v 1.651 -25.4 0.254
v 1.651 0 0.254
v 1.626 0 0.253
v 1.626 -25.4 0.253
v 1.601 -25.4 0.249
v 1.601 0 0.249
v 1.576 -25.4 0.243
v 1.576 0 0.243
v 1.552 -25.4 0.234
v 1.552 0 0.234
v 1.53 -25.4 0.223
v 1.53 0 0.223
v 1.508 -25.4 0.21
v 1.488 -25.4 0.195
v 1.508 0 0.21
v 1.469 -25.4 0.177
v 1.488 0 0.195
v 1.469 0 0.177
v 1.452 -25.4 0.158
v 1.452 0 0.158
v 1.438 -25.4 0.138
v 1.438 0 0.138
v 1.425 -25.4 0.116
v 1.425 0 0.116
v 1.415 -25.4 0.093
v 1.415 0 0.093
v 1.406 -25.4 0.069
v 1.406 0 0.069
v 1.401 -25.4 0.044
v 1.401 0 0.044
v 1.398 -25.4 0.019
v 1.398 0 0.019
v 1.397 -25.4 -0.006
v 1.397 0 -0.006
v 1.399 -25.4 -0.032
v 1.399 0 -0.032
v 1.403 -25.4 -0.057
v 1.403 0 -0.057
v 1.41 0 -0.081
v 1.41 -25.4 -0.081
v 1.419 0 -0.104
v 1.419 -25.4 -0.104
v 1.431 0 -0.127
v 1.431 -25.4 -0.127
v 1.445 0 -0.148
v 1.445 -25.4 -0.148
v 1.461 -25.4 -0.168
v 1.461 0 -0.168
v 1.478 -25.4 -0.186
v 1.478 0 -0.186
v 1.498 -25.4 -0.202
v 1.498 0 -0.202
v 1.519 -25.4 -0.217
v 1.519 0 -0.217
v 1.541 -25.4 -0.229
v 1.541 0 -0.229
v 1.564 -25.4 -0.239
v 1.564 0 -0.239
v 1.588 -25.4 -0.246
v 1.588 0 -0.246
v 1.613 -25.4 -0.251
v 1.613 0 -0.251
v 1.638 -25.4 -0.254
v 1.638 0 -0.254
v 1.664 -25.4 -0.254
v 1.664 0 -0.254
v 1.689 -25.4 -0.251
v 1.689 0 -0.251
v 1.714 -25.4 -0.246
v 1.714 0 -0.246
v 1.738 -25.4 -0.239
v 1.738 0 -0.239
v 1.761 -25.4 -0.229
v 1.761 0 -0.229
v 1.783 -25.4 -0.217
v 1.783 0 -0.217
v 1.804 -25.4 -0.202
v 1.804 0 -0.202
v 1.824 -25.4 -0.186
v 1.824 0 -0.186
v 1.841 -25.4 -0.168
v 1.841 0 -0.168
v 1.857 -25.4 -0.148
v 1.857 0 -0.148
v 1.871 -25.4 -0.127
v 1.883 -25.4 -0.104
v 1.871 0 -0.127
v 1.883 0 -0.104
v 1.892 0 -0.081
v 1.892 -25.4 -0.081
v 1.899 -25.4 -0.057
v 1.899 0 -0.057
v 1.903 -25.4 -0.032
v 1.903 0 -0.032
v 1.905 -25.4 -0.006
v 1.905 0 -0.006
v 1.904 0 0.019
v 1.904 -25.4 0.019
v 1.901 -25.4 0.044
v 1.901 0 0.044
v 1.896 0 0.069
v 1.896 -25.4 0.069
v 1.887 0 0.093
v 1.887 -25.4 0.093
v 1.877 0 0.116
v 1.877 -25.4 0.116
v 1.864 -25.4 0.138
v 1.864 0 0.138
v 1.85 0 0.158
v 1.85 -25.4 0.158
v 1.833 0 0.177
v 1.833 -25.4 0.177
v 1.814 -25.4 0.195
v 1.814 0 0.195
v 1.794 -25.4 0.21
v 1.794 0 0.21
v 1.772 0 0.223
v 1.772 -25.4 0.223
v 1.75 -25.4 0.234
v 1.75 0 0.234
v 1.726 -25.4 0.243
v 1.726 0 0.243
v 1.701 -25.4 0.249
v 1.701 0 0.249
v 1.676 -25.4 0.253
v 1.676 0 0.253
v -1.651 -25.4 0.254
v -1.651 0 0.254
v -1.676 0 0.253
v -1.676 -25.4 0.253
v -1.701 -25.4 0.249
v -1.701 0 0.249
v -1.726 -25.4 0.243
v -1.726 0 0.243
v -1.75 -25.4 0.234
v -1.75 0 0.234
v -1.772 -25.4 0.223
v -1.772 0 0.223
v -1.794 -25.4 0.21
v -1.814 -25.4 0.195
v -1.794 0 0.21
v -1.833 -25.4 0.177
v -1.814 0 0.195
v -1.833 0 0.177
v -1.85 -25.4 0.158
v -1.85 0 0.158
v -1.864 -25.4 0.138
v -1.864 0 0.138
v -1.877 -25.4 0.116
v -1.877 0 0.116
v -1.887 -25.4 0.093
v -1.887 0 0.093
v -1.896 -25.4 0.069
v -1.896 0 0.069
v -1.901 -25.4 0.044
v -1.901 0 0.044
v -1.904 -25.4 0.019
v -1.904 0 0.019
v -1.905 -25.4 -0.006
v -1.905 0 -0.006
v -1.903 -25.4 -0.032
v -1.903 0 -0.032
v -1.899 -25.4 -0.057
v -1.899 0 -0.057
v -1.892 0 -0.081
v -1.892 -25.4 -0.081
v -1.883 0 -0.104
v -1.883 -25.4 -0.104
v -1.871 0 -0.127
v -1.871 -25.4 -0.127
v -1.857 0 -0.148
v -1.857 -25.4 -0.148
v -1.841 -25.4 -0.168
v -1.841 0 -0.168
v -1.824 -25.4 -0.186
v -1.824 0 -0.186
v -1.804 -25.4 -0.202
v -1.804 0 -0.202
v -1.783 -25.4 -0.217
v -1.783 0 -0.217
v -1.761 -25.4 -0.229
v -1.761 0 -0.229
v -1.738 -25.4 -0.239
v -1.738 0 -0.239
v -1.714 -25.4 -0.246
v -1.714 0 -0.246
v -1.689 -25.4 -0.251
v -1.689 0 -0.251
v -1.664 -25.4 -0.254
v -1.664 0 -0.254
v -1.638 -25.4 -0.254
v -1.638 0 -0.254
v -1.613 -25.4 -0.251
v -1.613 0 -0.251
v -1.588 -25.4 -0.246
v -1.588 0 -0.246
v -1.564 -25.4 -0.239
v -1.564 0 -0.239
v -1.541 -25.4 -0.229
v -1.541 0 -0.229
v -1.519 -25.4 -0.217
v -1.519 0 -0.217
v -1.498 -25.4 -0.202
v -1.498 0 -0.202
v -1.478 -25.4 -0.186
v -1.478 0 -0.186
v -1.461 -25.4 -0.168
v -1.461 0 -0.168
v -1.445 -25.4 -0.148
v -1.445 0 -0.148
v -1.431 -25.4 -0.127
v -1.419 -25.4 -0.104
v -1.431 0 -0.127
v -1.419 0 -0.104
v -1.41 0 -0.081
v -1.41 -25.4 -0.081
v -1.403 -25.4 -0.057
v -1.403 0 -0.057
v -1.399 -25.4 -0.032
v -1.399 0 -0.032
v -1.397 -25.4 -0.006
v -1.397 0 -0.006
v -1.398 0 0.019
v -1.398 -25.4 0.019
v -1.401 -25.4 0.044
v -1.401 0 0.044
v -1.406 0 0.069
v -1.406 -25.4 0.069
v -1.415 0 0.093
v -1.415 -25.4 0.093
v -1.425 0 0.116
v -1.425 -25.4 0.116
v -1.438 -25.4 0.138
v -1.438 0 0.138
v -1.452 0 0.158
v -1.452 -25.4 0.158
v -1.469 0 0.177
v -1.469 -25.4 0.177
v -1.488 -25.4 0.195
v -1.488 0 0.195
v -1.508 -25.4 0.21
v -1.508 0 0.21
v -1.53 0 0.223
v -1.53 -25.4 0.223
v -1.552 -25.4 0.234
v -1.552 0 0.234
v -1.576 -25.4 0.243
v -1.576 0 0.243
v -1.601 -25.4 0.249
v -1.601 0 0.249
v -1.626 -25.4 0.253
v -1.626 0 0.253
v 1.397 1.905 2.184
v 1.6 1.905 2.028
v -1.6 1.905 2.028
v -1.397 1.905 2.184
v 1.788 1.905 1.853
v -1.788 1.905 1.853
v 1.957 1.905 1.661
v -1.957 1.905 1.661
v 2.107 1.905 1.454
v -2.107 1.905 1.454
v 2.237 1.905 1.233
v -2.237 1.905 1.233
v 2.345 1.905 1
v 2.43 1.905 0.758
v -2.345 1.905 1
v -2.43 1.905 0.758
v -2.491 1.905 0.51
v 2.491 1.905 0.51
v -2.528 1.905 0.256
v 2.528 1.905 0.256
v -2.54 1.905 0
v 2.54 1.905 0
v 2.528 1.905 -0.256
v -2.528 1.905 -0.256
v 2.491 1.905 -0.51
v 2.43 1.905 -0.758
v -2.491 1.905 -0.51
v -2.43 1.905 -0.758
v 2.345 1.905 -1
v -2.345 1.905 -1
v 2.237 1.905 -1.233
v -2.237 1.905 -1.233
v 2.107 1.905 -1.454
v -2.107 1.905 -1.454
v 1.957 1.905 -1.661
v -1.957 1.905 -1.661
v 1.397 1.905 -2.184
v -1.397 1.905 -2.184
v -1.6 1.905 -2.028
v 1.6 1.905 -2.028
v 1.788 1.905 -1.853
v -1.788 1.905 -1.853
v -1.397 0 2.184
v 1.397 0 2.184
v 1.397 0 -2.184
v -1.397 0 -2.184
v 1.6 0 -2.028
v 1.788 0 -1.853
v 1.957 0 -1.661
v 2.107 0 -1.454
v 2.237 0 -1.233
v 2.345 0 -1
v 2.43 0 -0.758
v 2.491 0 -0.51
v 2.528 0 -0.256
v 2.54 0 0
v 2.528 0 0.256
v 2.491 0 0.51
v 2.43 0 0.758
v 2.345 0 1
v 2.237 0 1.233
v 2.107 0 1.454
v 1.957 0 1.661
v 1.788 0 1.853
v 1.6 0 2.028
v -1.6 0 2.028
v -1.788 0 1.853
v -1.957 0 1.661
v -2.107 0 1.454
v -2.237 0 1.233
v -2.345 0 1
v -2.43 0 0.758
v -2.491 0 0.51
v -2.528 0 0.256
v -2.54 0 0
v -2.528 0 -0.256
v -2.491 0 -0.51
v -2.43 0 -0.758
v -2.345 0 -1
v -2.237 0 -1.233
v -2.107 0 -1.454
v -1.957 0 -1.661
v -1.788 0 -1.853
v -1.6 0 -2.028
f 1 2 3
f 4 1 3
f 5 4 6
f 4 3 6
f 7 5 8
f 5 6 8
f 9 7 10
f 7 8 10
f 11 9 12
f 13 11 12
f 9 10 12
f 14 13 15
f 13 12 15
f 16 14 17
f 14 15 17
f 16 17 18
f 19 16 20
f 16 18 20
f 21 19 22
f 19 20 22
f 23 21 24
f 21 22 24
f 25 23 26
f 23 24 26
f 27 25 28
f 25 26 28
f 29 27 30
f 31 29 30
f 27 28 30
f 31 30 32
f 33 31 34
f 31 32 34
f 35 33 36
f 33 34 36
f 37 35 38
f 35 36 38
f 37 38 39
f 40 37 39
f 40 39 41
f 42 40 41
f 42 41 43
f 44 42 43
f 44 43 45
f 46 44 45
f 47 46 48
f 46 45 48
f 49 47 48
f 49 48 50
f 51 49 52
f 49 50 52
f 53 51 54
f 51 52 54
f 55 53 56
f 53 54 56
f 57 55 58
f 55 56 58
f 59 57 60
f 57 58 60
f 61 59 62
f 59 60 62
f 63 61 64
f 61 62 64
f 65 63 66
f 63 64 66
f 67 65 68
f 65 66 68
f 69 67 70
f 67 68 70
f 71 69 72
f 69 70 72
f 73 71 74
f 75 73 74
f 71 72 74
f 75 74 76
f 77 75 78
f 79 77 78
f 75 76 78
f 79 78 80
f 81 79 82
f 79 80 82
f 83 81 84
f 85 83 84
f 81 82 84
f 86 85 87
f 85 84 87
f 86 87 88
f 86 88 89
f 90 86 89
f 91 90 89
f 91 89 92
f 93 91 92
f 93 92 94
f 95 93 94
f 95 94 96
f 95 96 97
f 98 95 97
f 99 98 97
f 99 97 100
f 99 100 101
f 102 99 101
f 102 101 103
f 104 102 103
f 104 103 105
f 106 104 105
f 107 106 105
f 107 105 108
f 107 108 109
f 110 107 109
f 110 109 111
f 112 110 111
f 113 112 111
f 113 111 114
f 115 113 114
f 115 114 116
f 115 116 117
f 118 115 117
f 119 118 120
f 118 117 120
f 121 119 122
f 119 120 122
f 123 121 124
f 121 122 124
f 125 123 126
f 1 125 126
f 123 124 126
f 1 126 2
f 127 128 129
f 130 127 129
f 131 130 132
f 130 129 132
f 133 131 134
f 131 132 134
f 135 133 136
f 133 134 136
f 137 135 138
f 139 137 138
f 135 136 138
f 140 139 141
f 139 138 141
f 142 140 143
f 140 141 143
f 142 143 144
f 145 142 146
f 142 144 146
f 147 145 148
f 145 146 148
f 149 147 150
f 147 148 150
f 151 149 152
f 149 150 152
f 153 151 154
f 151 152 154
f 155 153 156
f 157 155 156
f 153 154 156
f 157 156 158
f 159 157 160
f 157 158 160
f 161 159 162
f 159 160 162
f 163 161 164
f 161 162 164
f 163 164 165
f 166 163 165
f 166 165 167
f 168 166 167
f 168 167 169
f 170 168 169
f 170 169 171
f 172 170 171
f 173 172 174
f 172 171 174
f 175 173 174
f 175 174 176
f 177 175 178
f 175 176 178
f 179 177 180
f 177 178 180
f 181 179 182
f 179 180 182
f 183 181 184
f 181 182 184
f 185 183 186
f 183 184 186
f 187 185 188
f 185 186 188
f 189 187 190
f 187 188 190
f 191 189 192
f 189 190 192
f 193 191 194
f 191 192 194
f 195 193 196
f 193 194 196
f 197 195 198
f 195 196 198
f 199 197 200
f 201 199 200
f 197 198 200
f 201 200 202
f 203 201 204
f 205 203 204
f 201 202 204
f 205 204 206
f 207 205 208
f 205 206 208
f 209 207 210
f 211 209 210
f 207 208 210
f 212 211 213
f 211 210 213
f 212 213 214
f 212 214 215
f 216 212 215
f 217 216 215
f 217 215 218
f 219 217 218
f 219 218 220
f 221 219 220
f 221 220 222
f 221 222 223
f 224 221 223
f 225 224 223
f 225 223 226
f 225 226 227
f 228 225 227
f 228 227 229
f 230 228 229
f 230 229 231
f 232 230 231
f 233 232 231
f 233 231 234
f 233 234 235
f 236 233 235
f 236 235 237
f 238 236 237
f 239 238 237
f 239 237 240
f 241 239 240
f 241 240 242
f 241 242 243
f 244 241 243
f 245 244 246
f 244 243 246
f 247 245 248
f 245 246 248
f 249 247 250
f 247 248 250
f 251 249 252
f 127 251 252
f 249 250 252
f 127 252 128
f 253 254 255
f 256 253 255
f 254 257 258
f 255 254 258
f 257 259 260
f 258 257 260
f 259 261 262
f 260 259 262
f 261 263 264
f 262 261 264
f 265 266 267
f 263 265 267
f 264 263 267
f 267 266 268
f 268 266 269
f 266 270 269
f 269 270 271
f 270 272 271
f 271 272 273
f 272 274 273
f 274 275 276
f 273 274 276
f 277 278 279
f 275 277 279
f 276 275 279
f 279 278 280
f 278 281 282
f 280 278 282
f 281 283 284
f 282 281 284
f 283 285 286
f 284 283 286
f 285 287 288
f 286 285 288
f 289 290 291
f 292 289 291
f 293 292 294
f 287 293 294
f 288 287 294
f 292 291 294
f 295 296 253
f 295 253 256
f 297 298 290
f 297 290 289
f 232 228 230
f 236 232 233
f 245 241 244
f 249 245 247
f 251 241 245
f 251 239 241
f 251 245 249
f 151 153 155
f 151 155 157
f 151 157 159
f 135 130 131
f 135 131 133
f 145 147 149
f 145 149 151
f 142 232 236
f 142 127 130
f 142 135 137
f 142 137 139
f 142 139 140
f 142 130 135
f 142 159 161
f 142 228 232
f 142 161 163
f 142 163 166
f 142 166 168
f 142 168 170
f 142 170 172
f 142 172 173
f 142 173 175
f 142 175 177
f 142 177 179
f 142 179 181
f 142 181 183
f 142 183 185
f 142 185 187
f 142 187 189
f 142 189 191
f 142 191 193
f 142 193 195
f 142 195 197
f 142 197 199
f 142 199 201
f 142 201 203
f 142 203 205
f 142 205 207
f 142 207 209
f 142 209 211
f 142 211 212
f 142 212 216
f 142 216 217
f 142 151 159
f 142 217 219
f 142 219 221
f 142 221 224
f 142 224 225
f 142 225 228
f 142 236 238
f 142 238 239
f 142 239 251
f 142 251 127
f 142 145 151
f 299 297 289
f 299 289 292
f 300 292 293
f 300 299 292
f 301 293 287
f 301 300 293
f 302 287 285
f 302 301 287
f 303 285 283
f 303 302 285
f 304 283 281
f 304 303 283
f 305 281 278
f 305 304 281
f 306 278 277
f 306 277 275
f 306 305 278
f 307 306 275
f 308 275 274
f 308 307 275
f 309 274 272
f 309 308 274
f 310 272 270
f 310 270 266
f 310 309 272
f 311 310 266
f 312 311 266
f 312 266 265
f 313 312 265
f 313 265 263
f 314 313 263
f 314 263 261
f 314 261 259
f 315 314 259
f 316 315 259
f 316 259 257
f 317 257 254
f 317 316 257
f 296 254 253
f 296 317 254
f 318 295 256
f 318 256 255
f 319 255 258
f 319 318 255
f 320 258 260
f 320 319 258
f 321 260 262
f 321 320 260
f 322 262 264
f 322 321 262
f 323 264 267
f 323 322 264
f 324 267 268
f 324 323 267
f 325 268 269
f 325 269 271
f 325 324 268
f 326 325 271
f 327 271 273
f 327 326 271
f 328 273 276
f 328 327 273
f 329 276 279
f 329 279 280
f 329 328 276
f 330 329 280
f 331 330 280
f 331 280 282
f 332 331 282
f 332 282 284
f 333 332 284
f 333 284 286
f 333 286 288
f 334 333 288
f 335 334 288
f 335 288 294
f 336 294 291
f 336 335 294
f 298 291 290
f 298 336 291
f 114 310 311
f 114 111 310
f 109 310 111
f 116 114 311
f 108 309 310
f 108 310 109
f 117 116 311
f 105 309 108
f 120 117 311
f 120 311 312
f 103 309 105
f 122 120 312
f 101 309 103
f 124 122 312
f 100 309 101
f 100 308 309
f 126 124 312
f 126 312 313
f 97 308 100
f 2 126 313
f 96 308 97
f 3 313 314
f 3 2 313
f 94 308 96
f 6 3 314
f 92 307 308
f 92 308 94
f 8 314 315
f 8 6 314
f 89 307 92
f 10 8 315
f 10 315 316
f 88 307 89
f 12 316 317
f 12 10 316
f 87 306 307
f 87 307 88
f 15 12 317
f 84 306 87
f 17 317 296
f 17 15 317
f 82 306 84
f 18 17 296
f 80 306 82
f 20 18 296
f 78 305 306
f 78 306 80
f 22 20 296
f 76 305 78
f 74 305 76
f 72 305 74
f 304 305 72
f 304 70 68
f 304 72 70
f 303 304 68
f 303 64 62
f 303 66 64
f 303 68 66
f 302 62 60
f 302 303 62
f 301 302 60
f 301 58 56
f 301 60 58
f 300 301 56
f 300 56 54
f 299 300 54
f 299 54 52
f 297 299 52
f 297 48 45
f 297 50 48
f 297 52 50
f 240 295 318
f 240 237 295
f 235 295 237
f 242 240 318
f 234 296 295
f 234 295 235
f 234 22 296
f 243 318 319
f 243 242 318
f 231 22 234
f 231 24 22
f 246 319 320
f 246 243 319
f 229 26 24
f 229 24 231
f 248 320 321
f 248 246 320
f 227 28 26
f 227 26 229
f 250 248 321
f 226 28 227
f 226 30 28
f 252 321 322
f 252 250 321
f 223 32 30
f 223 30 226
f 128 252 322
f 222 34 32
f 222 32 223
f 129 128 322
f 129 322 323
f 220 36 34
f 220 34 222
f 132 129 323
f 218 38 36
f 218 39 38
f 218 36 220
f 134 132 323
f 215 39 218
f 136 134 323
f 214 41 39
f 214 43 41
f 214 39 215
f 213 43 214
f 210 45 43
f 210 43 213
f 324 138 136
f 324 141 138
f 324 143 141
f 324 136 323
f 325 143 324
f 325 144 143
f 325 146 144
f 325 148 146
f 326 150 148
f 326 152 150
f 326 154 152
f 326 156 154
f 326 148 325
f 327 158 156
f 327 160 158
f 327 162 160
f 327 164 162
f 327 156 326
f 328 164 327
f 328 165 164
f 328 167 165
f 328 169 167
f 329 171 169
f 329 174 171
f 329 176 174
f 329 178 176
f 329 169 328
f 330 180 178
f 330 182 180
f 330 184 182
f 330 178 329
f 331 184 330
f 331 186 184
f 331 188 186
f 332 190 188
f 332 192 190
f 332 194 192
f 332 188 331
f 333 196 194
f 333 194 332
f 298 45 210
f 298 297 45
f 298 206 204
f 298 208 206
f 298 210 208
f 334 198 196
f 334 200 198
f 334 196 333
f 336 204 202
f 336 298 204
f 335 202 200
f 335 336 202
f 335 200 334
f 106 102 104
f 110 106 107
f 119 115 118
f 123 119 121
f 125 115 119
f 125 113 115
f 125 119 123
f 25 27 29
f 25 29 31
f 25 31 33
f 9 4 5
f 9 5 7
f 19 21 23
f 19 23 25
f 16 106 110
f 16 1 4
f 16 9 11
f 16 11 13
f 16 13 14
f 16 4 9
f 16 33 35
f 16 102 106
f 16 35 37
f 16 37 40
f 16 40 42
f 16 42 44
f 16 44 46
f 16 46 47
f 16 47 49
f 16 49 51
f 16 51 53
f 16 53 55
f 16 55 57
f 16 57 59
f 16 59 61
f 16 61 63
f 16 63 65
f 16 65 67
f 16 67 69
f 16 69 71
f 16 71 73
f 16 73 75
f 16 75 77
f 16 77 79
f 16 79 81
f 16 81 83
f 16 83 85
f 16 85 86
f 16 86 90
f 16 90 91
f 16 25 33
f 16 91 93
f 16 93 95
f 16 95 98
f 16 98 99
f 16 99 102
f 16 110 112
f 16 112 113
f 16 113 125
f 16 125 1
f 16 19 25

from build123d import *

# Parameters (mm, degrees)
BOSS_EXTRUDE1_DEPTH = 1.905
SKETCH2_R           = 0.254
BOSS_EXTRUDE2_DEPTH = 25.4


with BuildPart() as part:
    # Sketch1 → Boss-Extrude1 (new body)
    with BuildSketch(Plane(origin=(0, 0, 0), x_dir=(1, 0, 0), z_dir=(0, 1, 0))):
        with BuildLine():
            Line((-1.397, 2.1844), (1.397, 2.1844))
            ThreePointArc((1.397, 2.1844), (2.54, 0), (1.397, -2.1844))
            Line((1.397, -2.1844), (-1.397, -2.1844))
            ThreePointArc((-1.397, -2.1844), (-2.54, 0), (-1.397, 2.1844))
        make_face()
    extrude(amount=BOSS_EXTRUDE1_DEPTH)

    # Sketch2 → Boss-Extrude2 (add)
    with BuildSketch(Plane.XZ):
        with Locations(Location((-1.651, 0, 0), (0, 0, 90))):
            Circle(SKETCH2_R)
        with Locations(Location((1.651, 0, 0), (0, 0, 90))):
            Circle(SKETCH2_R)
    extrude(amount=BOSS_EXTRUDE2_DEPTH)


solid = part.part
